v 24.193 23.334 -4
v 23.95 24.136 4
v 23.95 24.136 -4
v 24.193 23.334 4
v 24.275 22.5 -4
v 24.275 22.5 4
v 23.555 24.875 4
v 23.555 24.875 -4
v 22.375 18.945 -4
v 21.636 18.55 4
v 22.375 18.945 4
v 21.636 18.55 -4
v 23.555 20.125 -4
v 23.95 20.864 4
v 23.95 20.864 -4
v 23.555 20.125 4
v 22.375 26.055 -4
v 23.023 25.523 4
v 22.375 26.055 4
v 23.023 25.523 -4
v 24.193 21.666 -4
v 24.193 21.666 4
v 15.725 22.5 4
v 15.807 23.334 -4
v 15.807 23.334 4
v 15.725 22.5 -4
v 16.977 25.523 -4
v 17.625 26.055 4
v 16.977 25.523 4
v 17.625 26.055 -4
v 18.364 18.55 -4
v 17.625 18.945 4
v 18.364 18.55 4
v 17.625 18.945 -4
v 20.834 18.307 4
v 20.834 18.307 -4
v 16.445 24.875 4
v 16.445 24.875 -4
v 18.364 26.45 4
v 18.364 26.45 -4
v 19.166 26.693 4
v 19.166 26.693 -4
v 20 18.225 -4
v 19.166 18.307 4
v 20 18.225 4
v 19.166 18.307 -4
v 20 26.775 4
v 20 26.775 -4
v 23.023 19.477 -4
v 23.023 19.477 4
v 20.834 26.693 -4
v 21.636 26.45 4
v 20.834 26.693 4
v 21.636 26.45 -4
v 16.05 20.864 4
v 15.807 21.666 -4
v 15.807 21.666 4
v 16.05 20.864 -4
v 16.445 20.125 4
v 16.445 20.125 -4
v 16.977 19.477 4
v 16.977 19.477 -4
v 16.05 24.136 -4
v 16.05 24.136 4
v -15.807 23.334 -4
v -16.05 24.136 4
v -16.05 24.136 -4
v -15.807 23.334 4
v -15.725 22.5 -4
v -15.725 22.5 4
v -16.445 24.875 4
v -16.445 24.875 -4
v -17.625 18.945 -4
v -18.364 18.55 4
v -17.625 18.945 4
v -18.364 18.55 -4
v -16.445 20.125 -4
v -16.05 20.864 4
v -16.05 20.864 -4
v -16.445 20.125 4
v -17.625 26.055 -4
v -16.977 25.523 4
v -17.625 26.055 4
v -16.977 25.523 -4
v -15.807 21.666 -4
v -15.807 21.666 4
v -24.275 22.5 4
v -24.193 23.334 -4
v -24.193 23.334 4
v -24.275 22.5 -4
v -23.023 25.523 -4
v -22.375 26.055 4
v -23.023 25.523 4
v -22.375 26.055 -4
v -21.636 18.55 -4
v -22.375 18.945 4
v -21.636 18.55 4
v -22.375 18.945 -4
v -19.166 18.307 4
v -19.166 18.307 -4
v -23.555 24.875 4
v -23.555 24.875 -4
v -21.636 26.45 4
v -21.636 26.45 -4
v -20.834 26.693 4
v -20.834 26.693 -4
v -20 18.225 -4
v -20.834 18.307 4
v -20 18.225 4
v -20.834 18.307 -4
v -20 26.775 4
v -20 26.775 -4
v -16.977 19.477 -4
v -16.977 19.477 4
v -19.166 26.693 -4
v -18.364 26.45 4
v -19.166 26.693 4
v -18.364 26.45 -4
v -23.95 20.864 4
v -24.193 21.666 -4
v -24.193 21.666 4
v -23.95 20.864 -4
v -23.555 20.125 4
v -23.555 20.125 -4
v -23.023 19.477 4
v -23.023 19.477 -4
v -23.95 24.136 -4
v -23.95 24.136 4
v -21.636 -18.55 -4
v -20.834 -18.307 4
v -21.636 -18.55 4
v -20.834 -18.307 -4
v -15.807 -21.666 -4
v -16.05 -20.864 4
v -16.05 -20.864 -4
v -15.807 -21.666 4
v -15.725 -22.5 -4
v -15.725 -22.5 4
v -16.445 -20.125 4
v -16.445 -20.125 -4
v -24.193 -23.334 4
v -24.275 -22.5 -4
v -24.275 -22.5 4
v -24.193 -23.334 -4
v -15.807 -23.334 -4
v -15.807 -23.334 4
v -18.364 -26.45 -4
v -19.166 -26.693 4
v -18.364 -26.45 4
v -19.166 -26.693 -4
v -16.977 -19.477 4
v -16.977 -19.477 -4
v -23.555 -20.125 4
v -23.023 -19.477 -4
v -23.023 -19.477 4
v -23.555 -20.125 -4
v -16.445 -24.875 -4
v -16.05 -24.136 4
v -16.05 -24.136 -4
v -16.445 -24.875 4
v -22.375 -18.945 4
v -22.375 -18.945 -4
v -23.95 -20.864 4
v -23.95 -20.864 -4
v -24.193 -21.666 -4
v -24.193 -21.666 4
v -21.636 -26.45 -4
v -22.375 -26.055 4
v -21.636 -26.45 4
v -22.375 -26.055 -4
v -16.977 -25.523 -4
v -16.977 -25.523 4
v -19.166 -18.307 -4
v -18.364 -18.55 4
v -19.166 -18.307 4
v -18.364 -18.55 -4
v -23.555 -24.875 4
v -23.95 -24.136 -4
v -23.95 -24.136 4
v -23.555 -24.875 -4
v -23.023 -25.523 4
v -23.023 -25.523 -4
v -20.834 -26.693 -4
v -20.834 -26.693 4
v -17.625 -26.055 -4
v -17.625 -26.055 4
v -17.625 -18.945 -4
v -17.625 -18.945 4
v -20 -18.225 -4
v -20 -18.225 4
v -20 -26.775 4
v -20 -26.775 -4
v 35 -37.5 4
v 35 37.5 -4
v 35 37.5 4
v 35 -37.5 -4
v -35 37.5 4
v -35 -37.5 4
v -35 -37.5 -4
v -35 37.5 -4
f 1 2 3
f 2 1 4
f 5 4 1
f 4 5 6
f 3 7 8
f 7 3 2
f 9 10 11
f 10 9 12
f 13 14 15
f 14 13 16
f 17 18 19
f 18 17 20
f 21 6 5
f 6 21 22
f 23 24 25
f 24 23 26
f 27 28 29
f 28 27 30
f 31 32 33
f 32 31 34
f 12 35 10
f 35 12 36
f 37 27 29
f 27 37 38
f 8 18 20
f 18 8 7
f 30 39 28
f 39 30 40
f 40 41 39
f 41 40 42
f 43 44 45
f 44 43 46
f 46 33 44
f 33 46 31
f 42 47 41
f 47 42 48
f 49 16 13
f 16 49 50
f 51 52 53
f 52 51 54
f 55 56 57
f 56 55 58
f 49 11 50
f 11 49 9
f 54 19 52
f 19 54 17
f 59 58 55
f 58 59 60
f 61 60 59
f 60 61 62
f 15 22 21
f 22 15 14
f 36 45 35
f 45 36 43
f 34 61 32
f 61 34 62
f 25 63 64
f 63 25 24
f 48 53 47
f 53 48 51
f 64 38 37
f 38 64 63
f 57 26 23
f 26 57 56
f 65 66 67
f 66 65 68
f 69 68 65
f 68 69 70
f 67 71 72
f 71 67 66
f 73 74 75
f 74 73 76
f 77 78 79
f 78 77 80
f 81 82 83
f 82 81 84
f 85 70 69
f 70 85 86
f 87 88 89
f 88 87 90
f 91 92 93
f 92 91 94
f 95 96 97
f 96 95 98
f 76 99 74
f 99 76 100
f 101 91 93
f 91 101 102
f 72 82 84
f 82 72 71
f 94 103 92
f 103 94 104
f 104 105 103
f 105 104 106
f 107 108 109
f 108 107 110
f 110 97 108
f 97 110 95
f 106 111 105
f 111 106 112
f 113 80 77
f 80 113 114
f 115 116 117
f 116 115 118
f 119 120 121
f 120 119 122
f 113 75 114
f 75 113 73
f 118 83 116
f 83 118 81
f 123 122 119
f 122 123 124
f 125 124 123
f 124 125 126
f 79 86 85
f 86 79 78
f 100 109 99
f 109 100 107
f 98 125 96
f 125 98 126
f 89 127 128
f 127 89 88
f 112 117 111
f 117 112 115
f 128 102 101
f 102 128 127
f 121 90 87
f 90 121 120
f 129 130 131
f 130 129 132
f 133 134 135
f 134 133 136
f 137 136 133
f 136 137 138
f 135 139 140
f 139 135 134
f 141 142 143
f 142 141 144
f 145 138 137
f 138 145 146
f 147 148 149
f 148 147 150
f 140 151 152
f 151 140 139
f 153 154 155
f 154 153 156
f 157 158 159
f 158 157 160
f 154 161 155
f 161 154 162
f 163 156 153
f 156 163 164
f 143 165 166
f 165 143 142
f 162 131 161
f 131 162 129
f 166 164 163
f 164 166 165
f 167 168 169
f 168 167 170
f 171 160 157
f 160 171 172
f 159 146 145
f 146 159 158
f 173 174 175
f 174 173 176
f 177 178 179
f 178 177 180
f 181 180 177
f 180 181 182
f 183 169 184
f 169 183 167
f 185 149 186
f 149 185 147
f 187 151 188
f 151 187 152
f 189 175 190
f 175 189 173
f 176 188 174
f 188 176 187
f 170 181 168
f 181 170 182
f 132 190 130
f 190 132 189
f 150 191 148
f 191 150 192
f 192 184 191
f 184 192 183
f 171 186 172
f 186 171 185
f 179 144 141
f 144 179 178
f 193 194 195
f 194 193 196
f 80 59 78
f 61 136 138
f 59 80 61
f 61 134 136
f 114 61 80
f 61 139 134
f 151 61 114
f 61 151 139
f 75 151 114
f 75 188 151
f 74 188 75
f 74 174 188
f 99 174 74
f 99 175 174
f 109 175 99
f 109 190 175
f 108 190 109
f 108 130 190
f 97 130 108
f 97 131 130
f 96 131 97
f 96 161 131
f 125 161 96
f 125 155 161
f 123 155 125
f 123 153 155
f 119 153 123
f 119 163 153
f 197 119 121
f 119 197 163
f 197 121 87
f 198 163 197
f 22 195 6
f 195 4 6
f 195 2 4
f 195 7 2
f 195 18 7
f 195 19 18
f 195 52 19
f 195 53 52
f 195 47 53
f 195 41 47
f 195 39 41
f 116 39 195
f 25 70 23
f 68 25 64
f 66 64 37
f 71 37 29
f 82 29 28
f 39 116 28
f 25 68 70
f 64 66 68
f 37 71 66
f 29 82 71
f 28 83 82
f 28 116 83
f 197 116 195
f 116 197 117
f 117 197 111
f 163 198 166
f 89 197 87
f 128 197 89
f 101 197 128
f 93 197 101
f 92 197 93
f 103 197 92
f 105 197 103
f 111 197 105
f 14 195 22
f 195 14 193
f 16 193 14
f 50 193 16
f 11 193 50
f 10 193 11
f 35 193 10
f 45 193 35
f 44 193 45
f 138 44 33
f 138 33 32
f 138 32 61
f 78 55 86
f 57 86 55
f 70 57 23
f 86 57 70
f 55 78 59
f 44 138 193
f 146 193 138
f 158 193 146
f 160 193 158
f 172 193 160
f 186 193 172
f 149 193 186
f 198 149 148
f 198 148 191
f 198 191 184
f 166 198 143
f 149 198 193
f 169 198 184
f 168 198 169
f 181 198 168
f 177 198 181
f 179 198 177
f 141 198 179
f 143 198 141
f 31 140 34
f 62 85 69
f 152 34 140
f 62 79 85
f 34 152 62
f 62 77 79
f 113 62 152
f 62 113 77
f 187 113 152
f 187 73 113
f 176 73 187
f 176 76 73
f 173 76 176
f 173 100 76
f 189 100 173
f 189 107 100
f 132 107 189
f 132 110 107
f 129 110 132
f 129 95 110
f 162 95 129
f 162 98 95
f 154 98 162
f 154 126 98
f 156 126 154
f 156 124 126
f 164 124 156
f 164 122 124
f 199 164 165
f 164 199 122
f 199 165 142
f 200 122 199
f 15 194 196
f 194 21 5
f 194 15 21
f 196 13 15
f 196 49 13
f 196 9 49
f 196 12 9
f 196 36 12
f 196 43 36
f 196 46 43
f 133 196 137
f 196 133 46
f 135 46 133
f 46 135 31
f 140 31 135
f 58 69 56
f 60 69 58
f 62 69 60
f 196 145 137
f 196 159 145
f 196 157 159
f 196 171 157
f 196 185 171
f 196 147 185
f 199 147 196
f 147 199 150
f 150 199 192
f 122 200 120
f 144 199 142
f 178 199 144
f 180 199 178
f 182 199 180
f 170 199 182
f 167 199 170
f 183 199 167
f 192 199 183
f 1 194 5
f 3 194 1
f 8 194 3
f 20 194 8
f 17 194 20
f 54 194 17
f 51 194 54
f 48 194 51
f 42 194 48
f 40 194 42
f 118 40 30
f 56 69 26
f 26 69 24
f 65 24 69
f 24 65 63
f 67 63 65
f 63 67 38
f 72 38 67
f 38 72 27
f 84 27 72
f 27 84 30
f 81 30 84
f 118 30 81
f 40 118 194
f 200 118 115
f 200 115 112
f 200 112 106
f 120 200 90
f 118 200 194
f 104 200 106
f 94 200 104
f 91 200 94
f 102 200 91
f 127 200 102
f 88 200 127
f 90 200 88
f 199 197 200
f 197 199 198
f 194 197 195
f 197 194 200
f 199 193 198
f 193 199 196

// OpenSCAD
$fn = 32;

// ----------------------------------------------------------------------
// Corner plate 70 x 75 x 8
// 3 holes, centres taken from the edge offset
// ----------------------------------------------------------------------

// --- parameters (mm) ---
plate = [70, 75, 8];     // overall size (x, y, z)
holes = 3;               // number of holes the drawing asks for
bore_d = 8.4;            // nominal hole diameter from the drawing
print_allowance = 0.15;  // clearance added for printing
edge = 15;               // hole centre offset from the plate edge

// --- derived feature positions (mm) ---
hole_d = bore_d + print_allowance;  // = 8.55   hole diameter as printed
corner_x = plate[0] / 2 - edge;     // = 20   corner hole X
corner_y = plate[1] / 2 - edge;     // = 22.5   corner hole Y
feature_centers = [
  [corner_x, corner_y],
  [-corner_x, corner_y],
  [-corner_x, -corner_y]
];   // hole centres the loop below drills

// plate outline, every hole drilled through with the same cutters
difference() {
  cube(plate, center = true);
  for (centre = feature_centers)
    translate([centre[0], centre[1], 0])
      cylinder(d = hole_d, h = plate[2] + 2, center = true);
}
